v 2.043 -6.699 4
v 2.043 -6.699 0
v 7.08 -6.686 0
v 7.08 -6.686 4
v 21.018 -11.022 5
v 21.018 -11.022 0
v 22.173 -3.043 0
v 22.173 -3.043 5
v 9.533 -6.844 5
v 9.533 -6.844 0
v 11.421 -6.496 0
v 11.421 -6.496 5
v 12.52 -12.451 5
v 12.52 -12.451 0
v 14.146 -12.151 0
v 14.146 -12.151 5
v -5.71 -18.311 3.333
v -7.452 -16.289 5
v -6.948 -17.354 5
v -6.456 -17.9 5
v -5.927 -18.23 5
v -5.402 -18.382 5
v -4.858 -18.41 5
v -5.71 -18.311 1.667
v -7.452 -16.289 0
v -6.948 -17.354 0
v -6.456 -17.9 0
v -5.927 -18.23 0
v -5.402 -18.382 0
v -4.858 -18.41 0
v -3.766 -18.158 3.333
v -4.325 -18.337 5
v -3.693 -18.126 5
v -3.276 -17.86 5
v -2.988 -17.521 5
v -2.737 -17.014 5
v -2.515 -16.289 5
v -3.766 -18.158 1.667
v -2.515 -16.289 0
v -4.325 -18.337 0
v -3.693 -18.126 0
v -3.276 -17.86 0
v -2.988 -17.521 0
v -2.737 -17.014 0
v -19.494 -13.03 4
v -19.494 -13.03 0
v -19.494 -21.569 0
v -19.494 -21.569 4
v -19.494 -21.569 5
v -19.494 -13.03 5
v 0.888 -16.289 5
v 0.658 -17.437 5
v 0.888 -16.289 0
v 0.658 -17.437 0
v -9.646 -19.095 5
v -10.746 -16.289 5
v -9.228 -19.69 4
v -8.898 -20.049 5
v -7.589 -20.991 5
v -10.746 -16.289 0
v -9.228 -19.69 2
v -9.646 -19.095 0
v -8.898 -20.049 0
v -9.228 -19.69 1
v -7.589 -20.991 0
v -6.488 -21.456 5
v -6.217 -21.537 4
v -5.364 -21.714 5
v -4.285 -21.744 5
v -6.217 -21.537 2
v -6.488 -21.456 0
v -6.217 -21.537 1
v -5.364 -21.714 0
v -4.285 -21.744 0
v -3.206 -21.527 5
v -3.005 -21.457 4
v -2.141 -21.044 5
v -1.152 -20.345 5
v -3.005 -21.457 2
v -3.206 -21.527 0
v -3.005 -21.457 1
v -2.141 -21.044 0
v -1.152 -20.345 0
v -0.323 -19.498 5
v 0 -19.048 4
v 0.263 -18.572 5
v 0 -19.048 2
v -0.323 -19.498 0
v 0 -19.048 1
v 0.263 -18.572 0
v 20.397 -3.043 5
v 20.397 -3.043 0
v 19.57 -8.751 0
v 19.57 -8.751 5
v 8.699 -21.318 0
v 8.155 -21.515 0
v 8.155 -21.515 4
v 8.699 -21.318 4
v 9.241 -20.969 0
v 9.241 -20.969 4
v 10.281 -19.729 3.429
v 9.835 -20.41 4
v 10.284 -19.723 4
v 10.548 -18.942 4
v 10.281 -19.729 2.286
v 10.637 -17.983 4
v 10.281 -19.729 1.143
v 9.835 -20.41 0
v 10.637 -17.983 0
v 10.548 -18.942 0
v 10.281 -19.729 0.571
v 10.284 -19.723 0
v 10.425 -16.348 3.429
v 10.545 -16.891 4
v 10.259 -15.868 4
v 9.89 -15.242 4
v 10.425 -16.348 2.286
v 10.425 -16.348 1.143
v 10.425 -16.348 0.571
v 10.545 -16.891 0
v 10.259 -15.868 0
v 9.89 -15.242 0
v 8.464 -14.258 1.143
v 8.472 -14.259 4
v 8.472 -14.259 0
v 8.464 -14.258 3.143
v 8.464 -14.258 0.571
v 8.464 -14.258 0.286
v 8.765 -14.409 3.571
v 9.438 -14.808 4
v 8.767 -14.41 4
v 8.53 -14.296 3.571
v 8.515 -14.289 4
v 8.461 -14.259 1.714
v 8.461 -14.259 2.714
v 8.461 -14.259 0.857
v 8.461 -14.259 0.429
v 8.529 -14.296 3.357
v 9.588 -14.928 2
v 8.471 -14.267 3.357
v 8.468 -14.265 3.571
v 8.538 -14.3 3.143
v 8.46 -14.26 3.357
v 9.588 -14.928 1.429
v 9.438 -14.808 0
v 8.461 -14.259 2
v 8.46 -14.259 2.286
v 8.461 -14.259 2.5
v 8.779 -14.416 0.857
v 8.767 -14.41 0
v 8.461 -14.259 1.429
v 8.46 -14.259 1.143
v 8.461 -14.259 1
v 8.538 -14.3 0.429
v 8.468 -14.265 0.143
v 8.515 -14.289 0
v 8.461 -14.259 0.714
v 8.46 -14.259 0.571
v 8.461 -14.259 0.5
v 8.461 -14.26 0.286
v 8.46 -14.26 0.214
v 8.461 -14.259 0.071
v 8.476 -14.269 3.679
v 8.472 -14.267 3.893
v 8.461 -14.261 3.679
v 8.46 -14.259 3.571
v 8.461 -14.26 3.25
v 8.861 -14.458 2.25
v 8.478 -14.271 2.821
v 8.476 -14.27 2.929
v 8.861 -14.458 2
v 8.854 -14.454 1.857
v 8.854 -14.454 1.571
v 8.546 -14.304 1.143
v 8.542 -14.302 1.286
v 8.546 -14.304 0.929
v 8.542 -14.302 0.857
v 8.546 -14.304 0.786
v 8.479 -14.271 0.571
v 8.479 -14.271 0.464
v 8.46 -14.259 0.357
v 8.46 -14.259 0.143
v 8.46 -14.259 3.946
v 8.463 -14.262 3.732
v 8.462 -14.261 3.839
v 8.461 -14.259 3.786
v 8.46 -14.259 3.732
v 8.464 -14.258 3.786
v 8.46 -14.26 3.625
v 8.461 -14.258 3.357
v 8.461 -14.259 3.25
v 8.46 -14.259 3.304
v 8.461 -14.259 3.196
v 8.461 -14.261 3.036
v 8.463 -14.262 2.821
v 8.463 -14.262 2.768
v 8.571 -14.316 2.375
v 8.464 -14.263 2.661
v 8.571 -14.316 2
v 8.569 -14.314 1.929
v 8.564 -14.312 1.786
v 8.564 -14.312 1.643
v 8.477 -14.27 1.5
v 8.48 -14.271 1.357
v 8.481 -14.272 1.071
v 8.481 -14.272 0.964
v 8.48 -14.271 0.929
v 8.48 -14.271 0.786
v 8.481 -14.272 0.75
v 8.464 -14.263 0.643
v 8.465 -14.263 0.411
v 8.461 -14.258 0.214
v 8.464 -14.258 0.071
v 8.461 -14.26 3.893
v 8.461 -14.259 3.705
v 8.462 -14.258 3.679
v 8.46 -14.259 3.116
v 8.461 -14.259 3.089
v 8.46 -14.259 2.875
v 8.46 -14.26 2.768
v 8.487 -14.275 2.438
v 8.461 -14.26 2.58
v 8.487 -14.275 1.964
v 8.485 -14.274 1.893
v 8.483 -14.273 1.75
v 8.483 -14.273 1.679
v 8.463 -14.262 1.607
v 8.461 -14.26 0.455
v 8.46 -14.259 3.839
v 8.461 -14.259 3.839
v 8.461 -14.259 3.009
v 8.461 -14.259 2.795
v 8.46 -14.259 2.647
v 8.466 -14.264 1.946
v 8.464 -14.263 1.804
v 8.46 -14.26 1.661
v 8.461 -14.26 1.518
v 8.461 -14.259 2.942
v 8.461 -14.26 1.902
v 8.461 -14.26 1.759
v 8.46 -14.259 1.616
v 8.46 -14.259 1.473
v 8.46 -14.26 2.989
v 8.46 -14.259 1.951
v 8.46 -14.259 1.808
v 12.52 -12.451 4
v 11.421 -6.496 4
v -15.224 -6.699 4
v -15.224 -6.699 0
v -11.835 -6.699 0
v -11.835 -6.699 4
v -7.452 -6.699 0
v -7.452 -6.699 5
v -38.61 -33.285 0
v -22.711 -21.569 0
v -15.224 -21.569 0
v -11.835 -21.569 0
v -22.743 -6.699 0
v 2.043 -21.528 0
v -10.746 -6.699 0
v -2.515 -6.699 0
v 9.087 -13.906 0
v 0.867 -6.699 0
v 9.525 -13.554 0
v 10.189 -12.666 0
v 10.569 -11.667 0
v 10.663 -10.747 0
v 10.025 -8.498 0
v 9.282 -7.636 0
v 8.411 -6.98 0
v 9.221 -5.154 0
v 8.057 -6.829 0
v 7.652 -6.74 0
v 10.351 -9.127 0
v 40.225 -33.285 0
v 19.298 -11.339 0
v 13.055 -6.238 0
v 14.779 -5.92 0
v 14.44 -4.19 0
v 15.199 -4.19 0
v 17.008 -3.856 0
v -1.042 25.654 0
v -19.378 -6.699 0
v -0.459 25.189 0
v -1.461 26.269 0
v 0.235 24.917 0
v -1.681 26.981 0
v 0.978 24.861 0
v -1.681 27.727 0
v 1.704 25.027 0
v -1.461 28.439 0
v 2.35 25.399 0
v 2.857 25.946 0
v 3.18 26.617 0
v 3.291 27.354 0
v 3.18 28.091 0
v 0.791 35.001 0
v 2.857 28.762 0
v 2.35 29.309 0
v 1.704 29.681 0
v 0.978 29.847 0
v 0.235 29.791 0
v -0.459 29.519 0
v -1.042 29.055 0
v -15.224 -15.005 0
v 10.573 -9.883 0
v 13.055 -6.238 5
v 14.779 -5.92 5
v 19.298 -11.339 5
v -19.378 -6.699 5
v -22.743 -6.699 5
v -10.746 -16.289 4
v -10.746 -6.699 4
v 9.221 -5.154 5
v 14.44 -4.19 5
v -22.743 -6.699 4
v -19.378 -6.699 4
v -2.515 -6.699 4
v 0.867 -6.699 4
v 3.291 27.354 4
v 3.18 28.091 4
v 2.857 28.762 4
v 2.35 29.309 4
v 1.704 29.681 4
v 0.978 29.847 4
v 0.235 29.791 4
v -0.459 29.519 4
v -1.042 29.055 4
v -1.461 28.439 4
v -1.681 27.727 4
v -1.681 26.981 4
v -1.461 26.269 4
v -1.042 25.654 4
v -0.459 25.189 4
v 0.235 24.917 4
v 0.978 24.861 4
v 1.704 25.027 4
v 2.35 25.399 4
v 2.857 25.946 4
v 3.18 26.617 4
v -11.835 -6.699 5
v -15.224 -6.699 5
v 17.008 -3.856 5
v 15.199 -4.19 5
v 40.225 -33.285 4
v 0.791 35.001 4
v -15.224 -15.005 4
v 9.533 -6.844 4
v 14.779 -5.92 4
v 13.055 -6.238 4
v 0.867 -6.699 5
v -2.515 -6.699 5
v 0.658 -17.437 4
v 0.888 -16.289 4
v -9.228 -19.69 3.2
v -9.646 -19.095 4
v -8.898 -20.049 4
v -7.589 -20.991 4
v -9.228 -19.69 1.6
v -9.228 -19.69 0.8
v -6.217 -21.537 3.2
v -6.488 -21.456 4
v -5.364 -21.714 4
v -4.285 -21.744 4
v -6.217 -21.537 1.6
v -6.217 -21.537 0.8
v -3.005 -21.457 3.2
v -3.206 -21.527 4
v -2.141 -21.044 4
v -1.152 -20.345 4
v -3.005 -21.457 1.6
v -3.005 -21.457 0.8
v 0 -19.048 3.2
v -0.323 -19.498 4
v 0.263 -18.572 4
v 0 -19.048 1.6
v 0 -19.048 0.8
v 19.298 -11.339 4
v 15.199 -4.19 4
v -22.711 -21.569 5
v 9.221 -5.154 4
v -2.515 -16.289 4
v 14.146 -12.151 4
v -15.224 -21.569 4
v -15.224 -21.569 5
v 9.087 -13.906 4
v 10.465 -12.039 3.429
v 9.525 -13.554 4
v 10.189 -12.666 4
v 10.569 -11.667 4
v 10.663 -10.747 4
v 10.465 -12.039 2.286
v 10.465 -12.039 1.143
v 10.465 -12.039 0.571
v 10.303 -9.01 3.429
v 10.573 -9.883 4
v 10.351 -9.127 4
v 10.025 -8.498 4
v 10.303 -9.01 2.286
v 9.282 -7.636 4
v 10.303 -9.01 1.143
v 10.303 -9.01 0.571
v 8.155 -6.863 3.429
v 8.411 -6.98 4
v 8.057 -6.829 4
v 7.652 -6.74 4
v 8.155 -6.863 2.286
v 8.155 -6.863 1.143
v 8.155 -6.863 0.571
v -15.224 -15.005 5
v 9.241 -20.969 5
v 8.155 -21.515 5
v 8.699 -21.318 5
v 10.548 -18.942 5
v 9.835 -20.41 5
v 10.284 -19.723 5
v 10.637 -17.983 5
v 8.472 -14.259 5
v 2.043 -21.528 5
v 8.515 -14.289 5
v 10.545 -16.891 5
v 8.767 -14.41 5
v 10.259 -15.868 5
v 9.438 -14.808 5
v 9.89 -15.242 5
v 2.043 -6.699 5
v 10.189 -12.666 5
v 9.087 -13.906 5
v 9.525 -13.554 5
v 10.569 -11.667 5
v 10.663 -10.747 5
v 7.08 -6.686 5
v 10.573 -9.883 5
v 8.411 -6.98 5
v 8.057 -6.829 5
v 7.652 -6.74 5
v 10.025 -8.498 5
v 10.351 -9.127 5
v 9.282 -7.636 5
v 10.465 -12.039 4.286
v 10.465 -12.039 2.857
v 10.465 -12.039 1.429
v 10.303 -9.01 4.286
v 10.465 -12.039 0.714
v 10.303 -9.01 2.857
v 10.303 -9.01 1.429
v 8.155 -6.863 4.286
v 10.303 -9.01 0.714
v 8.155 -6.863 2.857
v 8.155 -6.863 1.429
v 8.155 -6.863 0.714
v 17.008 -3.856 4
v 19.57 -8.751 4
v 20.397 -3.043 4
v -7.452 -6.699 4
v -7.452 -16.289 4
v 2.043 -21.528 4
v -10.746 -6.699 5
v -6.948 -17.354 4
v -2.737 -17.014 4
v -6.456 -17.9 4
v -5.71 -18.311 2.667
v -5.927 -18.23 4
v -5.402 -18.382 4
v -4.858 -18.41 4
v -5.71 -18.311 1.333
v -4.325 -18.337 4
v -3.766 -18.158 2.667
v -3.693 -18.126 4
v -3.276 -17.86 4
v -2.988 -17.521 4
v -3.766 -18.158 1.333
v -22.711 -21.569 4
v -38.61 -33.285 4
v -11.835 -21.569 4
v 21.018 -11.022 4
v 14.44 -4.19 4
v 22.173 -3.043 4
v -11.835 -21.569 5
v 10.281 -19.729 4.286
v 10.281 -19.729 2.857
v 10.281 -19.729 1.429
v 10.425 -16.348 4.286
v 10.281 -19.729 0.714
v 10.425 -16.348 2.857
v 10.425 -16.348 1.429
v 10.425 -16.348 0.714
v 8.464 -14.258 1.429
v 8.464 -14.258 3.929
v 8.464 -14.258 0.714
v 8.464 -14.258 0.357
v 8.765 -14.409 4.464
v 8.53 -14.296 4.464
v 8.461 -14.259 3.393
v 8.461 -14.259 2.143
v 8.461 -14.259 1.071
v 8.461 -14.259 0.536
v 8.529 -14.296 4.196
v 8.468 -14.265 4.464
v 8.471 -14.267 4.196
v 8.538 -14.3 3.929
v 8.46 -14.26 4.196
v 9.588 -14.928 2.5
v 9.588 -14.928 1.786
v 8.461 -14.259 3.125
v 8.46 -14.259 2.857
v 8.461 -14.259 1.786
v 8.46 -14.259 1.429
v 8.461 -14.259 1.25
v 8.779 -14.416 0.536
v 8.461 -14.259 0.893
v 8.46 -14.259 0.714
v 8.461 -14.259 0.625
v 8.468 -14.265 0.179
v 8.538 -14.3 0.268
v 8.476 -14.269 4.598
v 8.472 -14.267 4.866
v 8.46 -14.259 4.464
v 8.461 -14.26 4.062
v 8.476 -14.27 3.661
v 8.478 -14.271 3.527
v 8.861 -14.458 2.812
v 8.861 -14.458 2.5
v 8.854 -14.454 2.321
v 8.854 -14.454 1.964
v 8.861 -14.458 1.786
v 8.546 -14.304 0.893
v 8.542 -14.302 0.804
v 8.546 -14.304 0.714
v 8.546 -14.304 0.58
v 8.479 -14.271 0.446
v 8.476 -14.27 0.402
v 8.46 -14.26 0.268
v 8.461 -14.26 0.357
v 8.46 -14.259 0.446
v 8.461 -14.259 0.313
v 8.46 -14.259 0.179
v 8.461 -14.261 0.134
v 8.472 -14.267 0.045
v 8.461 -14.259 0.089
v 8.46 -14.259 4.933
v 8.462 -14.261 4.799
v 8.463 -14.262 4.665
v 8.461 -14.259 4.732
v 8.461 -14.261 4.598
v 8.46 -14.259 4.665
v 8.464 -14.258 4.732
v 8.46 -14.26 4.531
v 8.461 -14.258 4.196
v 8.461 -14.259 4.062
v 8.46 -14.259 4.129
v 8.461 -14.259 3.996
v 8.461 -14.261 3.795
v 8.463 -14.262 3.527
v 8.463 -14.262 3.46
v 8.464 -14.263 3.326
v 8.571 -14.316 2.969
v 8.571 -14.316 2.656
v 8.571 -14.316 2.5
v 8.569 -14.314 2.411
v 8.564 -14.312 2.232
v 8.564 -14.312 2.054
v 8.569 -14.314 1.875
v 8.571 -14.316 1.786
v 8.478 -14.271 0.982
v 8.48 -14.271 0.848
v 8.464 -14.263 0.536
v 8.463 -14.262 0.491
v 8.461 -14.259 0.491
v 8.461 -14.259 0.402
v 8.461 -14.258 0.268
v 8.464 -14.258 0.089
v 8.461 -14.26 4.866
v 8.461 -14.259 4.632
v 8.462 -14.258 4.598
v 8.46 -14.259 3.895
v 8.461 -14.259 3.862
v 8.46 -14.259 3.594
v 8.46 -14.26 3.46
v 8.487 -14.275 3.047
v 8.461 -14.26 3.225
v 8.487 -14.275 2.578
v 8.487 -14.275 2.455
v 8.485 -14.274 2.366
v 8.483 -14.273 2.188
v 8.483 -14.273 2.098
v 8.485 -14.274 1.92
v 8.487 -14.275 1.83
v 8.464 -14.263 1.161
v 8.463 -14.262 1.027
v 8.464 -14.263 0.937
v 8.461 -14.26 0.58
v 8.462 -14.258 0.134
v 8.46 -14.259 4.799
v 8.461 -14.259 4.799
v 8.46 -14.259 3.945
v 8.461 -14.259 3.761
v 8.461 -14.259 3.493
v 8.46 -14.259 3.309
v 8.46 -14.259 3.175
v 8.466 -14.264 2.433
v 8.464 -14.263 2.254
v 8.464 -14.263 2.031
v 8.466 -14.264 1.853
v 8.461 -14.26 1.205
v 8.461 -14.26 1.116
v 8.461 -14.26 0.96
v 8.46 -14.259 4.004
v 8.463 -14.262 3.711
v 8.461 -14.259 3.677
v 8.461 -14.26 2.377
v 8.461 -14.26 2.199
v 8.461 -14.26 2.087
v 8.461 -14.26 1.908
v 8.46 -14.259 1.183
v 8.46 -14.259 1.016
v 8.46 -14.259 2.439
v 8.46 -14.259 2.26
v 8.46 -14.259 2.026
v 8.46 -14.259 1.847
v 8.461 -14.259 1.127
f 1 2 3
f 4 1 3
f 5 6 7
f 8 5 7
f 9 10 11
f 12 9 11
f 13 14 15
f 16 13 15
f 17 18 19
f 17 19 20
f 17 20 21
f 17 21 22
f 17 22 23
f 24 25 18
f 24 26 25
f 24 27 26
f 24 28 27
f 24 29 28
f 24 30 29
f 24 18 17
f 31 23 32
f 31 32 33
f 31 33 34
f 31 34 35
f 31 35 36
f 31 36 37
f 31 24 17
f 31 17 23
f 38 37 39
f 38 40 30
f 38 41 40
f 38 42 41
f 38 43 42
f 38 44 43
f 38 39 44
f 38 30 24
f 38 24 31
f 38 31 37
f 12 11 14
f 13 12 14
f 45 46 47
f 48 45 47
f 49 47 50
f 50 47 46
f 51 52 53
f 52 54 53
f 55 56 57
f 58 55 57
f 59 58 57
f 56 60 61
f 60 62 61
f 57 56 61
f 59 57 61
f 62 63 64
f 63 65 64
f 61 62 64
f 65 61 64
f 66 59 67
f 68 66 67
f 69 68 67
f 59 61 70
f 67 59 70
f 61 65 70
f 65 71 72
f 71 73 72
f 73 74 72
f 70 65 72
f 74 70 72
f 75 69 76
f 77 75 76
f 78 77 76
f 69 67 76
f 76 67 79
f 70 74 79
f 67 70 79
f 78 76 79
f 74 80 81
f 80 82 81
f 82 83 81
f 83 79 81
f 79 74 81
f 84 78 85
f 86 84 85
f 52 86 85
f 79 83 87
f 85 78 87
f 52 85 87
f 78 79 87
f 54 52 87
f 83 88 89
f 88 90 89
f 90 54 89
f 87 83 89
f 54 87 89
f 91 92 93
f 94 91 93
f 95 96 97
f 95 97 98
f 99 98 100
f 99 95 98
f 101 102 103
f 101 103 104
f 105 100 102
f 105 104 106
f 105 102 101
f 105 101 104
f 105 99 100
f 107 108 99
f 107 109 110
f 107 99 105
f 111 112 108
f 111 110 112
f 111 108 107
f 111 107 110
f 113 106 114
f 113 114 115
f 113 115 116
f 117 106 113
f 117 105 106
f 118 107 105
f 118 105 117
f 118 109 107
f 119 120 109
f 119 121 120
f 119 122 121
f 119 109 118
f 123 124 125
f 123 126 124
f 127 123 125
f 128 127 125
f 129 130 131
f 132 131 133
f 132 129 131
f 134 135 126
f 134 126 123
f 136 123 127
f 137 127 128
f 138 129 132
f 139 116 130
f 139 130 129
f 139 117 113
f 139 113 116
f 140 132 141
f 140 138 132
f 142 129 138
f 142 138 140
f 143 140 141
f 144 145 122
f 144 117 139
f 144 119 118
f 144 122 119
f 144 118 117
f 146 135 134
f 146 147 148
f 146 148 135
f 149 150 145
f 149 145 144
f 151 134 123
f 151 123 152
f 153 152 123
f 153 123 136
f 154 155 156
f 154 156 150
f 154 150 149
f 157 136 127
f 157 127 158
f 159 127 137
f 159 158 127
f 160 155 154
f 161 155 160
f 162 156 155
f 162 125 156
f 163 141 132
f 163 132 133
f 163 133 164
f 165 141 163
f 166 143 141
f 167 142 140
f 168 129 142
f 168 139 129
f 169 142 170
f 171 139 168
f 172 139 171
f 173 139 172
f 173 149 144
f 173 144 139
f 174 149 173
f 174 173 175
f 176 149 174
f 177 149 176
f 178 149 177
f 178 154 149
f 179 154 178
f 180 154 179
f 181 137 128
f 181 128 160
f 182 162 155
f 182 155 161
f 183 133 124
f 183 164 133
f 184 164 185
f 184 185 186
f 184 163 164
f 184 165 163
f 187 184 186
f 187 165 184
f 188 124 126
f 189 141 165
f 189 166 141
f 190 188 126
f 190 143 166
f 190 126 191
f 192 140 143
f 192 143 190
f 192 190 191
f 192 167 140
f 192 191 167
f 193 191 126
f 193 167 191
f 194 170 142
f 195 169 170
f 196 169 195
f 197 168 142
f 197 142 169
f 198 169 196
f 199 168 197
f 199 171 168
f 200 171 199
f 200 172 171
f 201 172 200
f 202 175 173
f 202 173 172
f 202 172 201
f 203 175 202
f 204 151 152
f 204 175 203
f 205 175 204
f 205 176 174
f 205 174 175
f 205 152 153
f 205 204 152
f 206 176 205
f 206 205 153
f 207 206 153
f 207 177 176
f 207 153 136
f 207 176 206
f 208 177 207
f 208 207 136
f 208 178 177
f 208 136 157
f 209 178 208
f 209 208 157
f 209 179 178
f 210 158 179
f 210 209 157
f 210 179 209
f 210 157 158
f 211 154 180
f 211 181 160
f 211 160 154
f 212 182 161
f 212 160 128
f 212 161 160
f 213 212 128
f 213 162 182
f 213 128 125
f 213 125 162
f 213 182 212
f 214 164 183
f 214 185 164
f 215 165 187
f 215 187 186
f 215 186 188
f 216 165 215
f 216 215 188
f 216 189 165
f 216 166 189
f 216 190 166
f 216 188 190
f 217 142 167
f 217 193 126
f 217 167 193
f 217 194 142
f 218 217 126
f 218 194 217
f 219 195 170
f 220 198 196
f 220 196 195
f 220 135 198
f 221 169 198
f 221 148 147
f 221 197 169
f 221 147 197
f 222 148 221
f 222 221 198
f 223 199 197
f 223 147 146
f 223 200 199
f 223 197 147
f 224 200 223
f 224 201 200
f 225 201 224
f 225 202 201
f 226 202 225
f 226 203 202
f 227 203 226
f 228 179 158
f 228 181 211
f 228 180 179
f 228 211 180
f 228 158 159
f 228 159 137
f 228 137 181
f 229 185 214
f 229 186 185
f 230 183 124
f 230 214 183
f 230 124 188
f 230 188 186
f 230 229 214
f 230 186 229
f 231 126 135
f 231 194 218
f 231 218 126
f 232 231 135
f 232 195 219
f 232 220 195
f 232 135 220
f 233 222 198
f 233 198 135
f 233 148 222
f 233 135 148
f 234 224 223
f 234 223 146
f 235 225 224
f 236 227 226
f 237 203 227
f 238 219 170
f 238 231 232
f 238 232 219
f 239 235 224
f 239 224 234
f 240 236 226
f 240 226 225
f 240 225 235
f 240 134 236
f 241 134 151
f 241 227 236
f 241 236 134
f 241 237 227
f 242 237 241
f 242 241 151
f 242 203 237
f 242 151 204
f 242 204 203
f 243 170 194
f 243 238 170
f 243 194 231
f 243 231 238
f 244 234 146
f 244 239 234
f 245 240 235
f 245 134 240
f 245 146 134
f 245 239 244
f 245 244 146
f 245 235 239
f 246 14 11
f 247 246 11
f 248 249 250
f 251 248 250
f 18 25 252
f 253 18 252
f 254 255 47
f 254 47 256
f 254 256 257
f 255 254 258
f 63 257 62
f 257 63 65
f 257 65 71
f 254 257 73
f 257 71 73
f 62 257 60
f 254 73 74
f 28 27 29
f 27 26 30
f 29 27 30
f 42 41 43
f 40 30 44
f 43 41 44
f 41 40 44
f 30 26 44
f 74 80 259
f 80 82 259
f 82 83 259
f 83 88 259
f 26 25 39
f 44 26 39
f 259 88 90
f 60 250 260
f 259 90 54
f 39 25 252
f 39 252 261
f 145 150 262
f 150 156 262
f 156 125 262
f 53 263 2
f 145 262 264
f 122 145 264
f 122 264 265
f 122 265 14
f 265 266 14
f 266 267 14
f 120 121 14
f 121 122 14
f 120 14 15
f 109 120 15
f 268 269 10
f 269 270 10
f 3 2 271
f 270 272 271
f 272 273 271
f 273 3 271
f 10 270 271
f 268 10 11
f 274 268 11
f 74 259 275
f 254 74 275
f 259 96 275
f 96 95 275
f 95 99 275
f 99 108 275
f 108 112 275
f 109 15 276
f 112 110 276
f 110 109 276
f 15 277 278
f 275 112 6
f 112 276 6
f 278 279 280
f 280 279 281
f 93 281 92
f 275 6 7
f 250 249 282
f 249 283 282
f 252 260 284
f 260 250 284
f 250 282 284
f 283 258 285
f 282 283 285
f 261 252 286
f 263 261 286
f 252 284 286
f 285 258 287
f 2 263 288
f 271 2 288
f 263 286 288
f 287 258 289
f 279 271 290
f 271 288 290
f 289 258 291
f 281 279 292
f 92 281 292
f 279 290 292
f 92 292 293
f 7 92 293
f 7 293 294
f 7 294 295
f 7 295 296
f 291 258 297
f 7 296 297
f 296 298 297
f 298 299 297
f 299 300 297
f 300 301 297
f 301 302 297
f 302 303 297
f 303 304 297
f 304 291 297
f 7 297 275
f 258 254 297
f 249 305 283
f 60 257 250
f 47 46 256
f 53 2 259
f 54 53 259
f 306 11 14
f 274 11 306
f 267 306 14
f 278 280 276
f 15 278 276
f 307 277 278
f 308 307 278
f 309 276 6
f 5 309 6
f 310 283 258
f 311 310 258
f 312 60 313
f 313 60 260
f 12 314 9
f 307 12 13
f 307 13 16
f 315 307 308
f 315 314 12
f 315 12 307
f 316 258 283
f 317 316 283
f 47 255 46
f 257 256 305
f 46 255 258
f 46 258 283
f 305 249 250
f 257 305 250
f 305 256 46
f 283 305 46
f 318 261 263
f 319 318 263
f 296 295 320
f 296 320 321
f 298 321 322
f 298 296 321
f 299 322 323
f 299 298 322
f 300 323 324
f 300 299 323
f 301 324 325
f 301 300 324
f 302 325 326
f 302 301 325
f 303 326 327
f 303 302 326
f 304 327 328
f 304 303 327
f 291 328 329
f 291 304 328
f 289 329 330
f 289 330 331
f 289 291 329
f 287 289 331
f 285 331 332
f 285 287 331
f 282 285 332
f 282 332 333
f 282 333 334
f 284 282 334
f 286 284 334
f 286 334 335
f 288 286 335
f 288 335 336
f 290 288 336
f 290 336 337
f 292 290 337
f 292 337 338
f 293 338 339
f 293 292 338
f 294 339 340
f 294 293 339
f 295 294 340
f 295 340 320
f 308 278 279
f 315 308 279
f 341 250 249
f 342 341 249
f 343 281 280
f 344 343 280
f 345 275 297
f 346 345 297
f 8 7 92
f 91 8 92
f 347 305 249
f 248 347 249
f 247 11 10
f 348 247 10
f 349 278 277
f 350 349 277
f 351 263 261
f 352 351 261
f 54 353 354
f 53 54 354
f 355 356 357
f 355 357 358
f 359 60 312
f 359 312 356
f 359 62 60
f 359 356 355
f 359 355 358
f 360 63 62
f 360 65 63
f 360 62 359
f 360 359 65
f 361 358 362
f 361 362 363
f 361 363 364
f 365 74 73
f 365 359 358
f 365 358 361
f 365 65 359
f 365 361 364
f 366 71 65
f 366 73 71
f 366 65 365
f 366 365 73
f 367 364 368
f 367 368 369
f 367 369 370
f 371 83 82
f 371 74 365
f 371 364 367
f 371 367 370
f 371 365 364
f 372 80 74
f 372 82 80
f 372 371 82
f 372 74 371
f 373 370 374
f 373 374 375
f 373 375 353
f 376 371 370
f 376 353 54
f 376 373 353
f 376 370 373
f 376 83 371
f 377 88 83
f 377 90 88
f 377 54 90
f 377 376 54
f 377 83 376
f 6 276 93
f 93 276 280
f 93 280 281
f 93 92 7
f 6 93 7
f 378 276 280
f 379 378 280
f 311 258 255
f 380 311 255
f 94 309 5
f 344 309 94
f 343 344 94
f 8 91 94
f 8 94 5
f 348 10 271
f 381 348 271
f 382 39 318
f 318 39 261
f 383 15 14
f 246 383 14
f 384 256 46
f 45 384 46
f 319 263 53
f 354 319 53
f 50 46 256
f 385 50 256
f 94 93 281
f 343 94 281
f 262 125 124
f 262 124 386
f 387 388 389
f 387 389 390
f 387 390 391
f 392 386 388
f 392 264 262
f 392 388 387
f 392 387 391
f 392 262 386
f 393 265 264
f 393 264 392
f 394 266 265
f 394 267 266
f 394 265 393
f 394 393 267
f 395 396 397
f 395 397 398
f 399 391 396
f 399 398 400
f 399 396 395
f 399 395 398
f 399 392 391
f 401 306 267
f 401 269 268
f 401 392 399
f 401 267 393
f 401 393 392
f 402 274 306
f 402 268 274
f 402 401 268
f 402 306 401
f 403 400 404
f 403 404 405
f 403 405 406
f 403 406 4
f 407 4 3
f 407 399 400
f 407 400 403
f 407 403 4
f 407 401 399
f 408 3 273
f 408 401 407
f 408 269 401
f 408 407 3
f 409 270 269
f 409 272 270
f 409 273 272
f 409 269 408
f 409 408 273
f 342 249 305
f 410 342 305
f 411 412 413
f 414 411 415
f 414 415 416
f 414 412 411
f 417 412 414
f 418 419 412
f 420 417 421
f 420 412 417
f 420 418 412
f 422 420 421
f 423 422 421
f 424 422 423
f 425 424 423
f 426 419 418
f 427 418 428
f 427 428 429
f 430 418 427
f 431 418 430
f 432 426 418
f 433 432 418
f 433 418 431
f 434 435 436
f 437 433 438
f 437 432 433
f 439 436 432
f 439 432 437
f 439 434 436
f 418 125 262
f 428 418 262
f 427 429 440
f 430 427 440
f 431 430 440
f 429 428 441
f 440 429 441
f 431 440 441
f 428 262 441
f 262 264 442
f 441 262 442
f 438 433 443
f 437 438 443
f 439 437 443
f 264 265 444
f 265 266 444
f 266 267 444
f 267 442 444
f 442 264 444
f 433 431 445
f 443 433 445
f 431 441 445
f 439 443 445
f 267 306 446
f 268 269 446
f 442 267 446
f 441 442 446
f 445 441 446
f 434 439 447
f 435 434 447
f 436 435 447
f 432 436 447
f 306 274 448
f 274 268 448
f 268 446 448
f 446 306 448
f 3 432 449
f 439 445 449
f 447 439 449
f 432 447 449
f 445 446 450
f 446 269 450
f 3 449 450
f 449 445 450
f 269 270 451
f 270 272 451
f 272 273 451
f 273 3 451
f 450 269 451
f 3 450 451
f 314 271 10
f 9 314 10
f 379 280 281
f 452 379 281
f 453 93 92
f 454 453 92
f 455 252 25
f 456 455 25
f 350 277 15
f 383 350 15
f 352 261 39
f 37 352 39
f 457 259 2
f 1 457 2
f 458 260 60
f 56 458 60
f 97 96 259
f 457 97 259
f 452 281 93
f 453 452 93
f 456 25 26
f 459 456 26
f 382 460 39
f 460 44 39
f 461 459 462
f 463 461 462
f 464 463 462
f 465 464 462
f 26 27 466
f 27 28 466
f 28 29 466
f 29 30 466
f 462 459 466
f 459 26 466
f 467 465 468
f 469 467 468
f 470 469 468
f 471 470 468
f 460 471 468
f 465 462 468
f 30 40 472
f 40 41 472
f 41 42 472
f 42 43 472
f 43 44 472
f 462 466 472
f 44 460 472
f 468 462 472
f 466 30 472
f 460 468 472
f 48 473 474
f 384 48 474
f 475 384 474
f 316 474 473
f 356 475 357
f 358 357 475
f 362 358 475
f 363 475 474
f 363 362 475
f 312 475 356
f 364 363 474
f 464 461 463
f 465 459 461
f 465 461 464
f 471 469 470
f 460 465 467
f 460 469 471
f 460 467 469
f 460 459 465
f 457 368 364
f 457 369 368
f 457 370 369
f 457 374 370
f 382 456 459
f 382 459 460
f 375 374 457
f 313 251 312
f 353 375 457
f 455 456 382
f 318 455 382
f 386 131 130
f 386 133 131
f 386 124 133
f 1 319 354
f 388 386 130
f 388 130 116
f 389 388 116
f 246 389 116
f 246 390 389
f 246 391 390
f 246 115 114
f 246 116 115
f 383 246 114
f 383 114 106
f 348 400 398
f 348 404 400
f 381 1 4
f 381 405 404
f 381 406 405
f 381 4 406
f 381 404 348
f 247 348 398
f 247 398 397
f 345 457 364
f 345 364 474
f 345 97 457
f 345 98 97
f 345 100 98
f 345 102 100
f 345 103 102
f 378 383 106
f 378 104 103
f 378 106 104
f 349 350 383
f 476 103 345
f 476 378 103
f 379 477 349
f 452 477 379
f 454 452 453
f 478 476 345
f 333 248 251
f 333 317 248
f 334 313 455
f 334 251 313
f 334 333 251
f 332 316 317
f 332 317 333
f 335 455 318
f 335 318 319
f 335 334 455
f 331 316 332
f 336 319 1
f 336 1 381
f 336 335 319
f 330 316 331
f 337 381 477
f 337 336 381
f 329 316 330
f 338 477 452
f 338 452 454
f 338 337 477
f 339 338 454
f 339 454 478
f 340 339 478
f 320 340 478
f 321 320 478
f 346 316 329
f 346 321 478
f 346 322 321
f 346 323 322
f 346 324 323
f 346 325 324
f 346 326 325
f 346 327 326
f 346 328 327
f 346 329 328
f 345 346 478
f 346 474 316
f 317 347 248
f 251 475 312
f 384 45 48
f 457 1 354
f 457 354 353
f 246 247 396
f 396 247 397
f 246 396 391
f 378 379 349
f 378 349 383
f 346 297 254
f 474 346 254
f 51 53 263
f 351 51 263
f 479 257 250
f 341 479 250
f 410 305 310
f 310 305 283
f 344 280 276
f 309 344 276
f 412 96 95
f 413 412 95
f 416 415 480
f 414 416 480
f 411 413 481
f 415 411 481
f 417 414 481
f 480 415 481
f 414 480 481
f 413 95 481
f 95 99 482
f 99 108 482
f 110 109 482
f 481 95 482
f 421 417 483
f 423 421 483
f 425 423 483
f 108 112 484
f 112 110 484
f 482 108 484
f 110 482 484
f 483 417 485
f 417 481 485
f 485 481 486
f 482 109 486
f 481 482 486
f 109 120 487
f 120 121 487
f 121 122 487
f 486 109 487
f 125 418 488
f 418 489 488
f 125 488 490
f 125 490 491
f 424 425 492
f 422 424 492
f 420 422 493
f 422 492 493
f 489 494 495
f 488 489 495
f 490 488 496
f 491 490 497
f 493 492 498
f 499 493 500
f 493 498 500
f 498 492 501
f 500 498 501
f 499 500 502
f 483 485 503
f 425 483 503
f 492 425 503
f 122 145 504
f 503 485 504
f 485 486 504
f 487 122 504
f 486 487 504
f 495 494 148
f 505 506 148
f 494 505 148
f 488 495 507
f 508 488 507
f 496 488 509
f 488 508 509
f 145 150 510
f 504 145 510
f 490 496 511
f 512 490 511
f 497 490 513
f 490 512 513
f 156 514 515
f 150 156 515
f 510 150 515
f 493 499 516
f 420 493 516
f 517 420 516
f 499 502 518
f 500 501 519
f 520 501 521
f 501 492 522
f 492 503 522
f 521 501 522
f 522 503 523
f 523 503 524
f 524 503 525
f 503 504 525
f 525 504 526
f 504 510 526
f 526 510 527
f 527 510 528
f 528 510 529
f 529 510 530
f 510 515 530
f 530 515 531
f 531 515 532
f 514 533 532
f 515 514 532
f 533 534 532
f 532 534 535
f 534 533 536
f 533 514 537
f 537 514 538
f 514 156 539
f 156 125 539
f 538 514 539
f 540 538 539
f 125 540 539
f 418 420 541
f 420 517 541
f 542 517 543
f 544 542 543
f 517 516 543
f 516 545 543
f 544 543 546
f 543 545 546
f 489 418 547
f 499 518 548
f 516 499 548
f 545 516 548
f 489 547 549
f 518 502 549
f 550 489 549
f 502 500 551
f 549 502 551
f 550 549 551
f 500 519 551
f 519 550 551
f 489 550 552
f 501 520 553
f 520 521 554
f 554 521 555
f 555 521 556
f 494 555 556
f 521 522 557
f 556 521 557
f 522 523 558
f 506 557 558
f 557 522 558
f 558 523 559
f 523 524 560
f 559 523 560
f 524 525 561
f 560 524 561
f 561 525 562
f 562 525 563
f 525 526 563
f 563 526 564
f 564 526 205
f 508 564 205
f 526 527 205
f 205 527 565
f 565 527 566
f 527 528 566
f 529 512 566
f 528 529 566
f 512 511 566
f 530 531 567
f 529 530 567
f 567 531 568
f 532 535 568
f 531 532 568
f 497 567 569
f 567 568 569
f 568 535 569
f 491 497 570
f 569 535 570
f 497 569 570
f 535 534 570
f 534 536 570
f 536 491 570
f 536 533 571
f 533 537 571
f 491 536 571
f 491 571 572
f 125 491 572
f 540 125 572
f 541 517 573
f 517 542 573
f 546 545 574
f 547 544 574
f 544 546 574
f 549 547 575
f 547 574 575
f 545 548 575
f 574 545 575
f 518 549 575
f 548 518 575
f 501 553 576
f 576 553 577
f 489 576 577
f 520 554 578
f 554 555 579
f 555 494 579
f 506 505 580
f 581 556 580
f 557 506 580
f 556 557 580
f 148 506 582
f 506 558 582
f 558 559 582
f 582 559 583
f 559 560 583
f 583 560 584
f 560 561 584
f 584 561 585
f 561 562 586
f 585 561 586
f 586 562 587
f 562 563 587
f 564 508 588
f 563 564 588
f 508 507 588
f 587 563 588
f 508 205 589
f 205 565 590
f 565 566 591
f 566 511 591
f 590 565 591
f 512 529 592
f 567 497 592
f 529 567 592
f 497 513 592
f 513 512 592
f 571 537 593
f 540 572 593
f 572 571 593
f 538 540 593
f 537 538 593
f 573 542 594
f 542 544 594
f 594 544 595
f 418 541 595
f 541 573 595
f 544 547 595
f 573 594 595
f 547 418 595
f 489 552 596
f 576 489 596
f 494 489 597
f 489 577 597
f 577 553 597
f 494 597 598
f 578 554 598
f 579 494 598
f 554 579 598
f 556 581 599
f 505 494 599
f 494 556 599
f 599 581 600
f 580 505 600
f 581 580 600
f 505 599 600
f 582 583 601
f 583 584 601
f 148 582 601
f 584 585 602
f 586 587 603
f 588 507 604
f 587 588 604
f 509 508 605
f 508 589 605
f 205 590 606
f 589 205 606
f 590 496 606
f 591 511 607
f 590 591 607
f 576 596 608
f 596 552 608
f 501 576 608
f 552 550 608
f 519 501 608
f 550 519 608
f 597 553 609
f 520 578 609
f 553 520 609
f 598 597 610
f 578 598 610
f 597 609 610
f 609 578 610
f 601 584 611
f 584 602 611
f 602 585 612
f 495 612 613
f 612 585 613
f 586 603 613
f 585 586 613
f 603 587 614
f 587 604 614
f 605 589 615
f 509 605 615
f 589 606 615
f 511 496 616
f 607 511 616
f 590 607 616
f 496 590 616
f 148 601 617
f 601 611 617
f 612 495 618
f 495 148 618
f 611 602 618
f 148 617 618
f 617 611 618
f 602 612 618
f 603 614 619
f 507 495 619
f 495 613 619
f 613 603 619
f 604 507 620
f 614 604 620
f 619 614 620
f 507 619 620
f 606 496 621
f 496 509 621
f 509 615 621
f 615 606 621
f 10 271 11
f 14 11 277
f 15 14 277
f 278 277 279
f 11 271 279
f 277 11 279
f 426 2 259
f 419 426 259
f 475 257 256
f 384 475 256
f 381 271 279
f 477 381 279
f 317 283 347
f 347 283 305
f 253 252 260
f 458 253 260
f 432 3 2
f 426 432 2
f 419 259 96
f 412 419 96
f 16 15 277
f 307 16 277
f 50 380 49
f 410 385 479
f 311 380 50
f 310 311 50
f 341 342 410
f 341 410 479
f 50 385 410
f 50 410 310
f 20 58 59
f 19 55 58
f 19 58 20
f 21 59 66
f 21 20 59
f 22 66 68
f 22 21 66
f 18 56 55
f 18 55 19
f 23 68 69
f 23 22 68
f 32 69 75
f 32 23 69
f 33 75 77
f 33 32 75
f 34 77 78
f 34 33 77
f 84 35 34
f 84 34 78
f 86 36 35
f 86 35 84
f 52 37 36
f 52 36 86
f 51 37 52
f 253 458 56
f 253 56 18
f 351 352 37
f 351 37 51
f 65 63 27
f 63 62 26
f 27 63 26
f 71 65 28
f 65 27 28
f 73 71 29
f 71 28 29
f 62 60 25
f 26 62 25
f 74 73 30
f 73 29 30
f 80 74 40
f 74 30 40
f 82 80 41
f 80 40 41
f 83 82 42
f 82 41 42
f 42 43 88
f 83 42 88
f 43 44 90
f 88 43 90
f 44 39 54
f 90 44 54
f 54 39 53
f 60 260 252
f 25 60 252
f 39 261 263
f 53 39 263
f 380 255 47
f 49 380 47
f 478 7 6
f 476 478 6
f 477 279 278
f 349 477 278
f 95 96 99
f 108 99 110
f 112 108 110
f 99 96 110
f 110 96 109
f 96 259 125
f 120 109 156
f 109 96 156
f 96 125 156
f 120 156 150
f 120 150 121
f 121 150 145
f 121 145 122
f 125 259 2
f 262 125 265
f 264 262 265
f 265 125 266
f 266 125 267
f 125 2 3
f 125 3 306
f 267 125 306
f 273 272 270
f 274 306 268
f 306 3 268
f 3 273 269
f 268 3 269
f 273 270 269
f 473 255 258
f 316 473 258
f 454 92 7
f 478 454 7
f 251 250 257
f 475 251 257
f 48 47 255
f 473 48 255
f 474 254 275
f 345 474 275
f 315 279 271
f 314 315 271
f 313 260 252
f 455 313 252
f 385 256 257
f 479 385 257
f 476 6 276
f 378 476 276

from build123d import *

# Parameters (mm, degrees)
F0_R     = 2.5
F1_DEPTH = 4
F2_DEPTH = 5


with BuildPart() as f1:
    # F0 (on Top) → F1 (new body)
    with BuildSketch(Plane.XY):
        Polygon((40.2249097824, -33.2845642026), (0.7910795393, 35.0014455616), (-38.6101437698, -33.2845642026), align=None)
        Polygon((-22.711256519, -21.5691067278), (-22.7432120591, -6.6985134035), (-19.3776357919, -6.6985134035), (-15.2243720368, -15.0050409138), (-15.2243720368, -6.6985134035), (-11.8349278346, -6.6985134035), (-11.8349278346, -21.5691067278), (-15.2243720368, -21.5691067278), (-19.4941520691, -13.0295466632), (-19.4941520691, -21.5691067278), align=None, mode=Mode.SUBTRACT)
        with BuildLine():
            Line((-10.7459938154, -16.2890758365), (-10.7459938154, -6.6985134035))
            Line((-10.7459938154, -6.6985134035), (-7.4523133226, -6.6985134035))
            Line((-7.4523133226, -6.6985134035), (-7.4523133226, -16.2890758365))
            add(Edge.make_bspline(
                [(-7.4523133226, -16.2890758365), (-7.104227785, -17.3948928714), (-5.9321515736, -18.6541323706), (-3.5113082752, -18.2625094616), (-2.8233632911, -17.5249073654), (-2.5152703747, -16.2890758365)],
                knots=[0, 0, 0, 0, 0.3606281433, 0.6689083068, 1, 1, 1, 1], degree=3))
            Line((-2.5152703747, -16.2890758365), (-2.5152703747, -6.6985134035))
            Line((-2.5152703747, -6.6985134035), (0.8672598962, -6.6985134035))
            Line((0.8672598962, -6.6985134035), (0.8878691346, -16.2890758365))
            add(Edge.make_bspline(
                [(-10.7459938154, -16.2890758365), (-10.3705837507, -17.509364821), (-9.6394174556, -19.9654712701), (-6.2613093559, -21.814346697), (-2.9111281737, -21.881232593), (0.377460507, -19.2509243312), (0.7230390529, -17.2143038611), (0.8878691346, -16.2890758365)],
                knots=[0, 0, 0, 0, 0.2082712182, 0.4110782797, 0.6044961637, 0.8162808924, 1, 1, 1, 1], degree=3))
        make_face(mode=Mode.SUBTRACT)
        with BuildLine():
            Line((2.0429338329, -21.5279925615), (2.0429338329, -6.6985134035))
            Line((2.0429338329, -6.6985134035), (7.0795952342, -6.6859629005))
            add(Edge.make_bspline(
                [(8.4721948951, -14.2592713237), (8.8166718167, -14.0775473446), (9.597126329, -13.6656191693), (10.625602672, -12.0765617302), (10.725820643, -10.3211699754), (10.3492292442, -8.971041011), (9.739299995, -8.0281158452), (8.29926641, -6.6774752044), (7.2941144713, -6.7181425698), (7.0795952342, -6.6859629005)],
                knots=[0, 0, 0, 0, 0.1315192433, 0.2913220213, 0.4480658363, 0.5848317356, 0.7113085718, 0.8762590374, 1, 1, 1, 1], degree=3))
            add(Edge.make_bspline(
                [(8.1550851464, -21.5148581093), (8.5888431896, -21.4379623141), (9.5782273725, -20.807535605), (10.3533522247, -19.7559345188), (10.7186253304, -18.4311716851), (10.5557425558, -16.283646946), (9.7449551739, -14.7909007915), (8.402703745, -14.2505356974), (8.4661261596, -14.2585018978), (8.4721948951, -14.2592713237)],
                knots=[0, 0, 0, 0, 0.1651828804, 0.3170172375, 0.4709365332, 0.6640285426, 0.8442617499, 0.9854400695, 1, 1, 1, 1], degree=3))
            Line((8.1550851464, -21.5148581093), (2.0429338329, -21.5279925615))
        make_face(mode=Mode.SUBTRACT)
        Polygon((9.2211738229, -5.1535996608), (14.4397988915, -4.1901608929), (14.7794780436, -5.9196936403), (13.0546678668, -6.2381202315), (14.1462272019, -12.1507314943), (12.5199611083, -12.4509653262), (11.4205734342, -6.4959505735), (9.5333156725, -6.8443674972), align=None, mode=Mode.SUBTRACT)
        Polygon((20.3966814885, -3.0428403988), (22.1730712801, -3.0428403988), (21.0180655122, -11.0216652974), (19.2980058122, -11.3392148773), (15.1990214363, -4.1901608929), (17.0081812404, -3.856162058), (19.5704009384, -8.7508186698), align=None, mode=Mode.SUBTRACT)
        with Locations((0.7910795393, 27.3540709168)):
            Circle(F0_R, mode=Mode.SUBTRACT)
    extrude(amount=F1_DEPTH)


with BuildPart() as f2:
    # F0 (on Top) → F2 (new body)
    with BuildSketch(Plane.XY):
        Polygon((-19.3776357919, -6.6985134035), (-22.7432120591, -6.6985134035), (-22.711256519, -21.5691067278), (-19.4941520691, -21.5691067278), (-19.4941520691, -13.0295466632), (-15.2243720368, -21.5691067278), (-11.8349278346, -21.5691067278), (-11.8349278346, -6.6985134035), (-15.2243720368, -6.6985134035), (-15.2243720368, -15.0050409138), align=None)
    extrude(amount=F2_DEPTH)


with BuildPart() as f2b:
    # F0 (on Top) → F2, piece 2 (new body)
    with BuildSketch(Plane.XY):
        with BuildLine():
            Line((-7.4523133226, -6.6985134035), (-10.7459938154, -6.6985134035))
            Line((-10.7459938154, -6.6985134035), (-10.7459938154, -16.2890758365))
            add(Edge.make_bspline(
                [(-10.7459938154, -16.2890758365), (-10.3705837507, -17.509364821), (-9.6394174556, -19.9654712701), (-6.2613093559, -21.814346697), (-2.9111281737, -21.881232593), (0.377460507, -19.2509243312), (0.7230390529, -17.2143038611), (0.8878691346, -16.2890758365)],
                knots=[0, 0, 0, 0, 0.2082712182, 0.4110782797, 0.6044961637, 0.8162808924, 1, 1, 1, 1], degree=3))
            Line((0.8878691346, -16.2890758365), (0.8672598962, -6.6985134035))
            Line((0.8672598962, -6.6985134035), (-2.5152703747, -6.6985134035))
            Line((-2.5152703747, -6.6985134035), (-2.5152703747, -16.2890758365))
            add(Edge.make_bspline(
                [(-7.4523133226, -16.2890758365), (-7.104227785, -17.3948928714), (-5.9321515736, -18.6541323706), (-3.5113082752, -18.2625094616), (-2.8233632911, -17.5249073654), (-2.5152703747, -16.2890758365)],
                knots=[0, 0, 0, 0, 0.3606281433, 0.6689083068, 1, 1, 1, 1], degree=3))
            Line((-7.4523133226, -16.2890758365), (-7.4523133226, -6.6985134035))
        make_face()
    extrude(amount=F2_DEPTH)


with BuildPart() as f2c:
    # F0 (on Top) → F2, piece 3 (new body)
    with BuildSketch(Plane.XY):
        with BuildLine():
            Line((7.0795952342, -6.6859629005), (2.0429338329, -6.6985134035))
            Line((2.0429338329, -6.6985134035), (2.0429338329, -21.5279925615))
            Line((2.0429338329, -21.5279925615), (8.1550851464, -21.5148581093))
            add(Edge.make_bspline(
                [(8.1550851464, -21.5148581093), (8.5888431896, -21.4379623141), (9.5782273725, -20.807535605), (10.3533522247, -19.7559345188), (10.7186253304, -18.4311716851), (10.5557425558, -16.283646946), (9.7449551739, -14.7909007915), (8.402703745, -14.2505356974), (8.4661261596, -14.2585018978), (8.4721948951, -14.2592713237)],
                knots=[0, 0, 0, 0, 0.1651828804, 0.3170172375, 0.4709365332, 0.6640285426, 0.8442617499, 0.9854400695, 1, 1, 1, 1], degree=3))
            add(Edge.make_bspline(
                [(8.4721948951, -14.2592713237), (8.8166718167, -14.0775473446), (9.597126329, -13.6656191693), (10.625602672, -12.0765617302), (10.725820643, -10.3211699754), (10.3492292442, -8.971041011), (9.739299995, -8.0281158452), (8.29926641, -6.6774752044), (7.2941144713, -6.7181425698), (7.0795952342, -6.6859629005)],
                knots=[0, 0, 0, 0, 0.1315192433, 0.2913220213, 0.4480658363, 0.5848317356, 0.7113085718, 0.8762590374, 1, 1, 1, 1], degree=3))
        make_face()
    extrude(amount=F2_DEPTH)


with BuildPart() as f2d:
    # F0 (on Top) → F2, piece 4 (new body)
    with BuildSketch(Plane.XY):
        Polygon((14.7794780436, -5.9196936403), (14.4397988915, -4.1901608929), (9.2211738229, -5.1535996608), (9.5333156725, -6.8443674972), (11.4205734342, -6.4959505735), (12.5199611083, -12.4509653262), (14.1462272019, -12.1507314943), (13.0546678668, -6.2381202315), align=None)
    extrude(amount=F2_DEPTH)


with BuildPart() as f2e:
    # F0 (on Top) → F2, piece 5 (new body)
    with BuildSketch(Plane.XY):
        Polygon((21.0180655122, -11.0216652974), (22.1730712801, -3.0428403988), (20.3966814885, -3.0428403988), (19.5704009384, -8.7508186698), (17.0081812404, -3.856162058), (15.1990214363, -4.1901608929), (19.2980058122, -11.3392148773), align=None)
    extrude(amount=F2_DEPTH)


solid = Compound([f1.part, f2.part, f2b.part, f2c.part, f2d.part, f2e.part])
